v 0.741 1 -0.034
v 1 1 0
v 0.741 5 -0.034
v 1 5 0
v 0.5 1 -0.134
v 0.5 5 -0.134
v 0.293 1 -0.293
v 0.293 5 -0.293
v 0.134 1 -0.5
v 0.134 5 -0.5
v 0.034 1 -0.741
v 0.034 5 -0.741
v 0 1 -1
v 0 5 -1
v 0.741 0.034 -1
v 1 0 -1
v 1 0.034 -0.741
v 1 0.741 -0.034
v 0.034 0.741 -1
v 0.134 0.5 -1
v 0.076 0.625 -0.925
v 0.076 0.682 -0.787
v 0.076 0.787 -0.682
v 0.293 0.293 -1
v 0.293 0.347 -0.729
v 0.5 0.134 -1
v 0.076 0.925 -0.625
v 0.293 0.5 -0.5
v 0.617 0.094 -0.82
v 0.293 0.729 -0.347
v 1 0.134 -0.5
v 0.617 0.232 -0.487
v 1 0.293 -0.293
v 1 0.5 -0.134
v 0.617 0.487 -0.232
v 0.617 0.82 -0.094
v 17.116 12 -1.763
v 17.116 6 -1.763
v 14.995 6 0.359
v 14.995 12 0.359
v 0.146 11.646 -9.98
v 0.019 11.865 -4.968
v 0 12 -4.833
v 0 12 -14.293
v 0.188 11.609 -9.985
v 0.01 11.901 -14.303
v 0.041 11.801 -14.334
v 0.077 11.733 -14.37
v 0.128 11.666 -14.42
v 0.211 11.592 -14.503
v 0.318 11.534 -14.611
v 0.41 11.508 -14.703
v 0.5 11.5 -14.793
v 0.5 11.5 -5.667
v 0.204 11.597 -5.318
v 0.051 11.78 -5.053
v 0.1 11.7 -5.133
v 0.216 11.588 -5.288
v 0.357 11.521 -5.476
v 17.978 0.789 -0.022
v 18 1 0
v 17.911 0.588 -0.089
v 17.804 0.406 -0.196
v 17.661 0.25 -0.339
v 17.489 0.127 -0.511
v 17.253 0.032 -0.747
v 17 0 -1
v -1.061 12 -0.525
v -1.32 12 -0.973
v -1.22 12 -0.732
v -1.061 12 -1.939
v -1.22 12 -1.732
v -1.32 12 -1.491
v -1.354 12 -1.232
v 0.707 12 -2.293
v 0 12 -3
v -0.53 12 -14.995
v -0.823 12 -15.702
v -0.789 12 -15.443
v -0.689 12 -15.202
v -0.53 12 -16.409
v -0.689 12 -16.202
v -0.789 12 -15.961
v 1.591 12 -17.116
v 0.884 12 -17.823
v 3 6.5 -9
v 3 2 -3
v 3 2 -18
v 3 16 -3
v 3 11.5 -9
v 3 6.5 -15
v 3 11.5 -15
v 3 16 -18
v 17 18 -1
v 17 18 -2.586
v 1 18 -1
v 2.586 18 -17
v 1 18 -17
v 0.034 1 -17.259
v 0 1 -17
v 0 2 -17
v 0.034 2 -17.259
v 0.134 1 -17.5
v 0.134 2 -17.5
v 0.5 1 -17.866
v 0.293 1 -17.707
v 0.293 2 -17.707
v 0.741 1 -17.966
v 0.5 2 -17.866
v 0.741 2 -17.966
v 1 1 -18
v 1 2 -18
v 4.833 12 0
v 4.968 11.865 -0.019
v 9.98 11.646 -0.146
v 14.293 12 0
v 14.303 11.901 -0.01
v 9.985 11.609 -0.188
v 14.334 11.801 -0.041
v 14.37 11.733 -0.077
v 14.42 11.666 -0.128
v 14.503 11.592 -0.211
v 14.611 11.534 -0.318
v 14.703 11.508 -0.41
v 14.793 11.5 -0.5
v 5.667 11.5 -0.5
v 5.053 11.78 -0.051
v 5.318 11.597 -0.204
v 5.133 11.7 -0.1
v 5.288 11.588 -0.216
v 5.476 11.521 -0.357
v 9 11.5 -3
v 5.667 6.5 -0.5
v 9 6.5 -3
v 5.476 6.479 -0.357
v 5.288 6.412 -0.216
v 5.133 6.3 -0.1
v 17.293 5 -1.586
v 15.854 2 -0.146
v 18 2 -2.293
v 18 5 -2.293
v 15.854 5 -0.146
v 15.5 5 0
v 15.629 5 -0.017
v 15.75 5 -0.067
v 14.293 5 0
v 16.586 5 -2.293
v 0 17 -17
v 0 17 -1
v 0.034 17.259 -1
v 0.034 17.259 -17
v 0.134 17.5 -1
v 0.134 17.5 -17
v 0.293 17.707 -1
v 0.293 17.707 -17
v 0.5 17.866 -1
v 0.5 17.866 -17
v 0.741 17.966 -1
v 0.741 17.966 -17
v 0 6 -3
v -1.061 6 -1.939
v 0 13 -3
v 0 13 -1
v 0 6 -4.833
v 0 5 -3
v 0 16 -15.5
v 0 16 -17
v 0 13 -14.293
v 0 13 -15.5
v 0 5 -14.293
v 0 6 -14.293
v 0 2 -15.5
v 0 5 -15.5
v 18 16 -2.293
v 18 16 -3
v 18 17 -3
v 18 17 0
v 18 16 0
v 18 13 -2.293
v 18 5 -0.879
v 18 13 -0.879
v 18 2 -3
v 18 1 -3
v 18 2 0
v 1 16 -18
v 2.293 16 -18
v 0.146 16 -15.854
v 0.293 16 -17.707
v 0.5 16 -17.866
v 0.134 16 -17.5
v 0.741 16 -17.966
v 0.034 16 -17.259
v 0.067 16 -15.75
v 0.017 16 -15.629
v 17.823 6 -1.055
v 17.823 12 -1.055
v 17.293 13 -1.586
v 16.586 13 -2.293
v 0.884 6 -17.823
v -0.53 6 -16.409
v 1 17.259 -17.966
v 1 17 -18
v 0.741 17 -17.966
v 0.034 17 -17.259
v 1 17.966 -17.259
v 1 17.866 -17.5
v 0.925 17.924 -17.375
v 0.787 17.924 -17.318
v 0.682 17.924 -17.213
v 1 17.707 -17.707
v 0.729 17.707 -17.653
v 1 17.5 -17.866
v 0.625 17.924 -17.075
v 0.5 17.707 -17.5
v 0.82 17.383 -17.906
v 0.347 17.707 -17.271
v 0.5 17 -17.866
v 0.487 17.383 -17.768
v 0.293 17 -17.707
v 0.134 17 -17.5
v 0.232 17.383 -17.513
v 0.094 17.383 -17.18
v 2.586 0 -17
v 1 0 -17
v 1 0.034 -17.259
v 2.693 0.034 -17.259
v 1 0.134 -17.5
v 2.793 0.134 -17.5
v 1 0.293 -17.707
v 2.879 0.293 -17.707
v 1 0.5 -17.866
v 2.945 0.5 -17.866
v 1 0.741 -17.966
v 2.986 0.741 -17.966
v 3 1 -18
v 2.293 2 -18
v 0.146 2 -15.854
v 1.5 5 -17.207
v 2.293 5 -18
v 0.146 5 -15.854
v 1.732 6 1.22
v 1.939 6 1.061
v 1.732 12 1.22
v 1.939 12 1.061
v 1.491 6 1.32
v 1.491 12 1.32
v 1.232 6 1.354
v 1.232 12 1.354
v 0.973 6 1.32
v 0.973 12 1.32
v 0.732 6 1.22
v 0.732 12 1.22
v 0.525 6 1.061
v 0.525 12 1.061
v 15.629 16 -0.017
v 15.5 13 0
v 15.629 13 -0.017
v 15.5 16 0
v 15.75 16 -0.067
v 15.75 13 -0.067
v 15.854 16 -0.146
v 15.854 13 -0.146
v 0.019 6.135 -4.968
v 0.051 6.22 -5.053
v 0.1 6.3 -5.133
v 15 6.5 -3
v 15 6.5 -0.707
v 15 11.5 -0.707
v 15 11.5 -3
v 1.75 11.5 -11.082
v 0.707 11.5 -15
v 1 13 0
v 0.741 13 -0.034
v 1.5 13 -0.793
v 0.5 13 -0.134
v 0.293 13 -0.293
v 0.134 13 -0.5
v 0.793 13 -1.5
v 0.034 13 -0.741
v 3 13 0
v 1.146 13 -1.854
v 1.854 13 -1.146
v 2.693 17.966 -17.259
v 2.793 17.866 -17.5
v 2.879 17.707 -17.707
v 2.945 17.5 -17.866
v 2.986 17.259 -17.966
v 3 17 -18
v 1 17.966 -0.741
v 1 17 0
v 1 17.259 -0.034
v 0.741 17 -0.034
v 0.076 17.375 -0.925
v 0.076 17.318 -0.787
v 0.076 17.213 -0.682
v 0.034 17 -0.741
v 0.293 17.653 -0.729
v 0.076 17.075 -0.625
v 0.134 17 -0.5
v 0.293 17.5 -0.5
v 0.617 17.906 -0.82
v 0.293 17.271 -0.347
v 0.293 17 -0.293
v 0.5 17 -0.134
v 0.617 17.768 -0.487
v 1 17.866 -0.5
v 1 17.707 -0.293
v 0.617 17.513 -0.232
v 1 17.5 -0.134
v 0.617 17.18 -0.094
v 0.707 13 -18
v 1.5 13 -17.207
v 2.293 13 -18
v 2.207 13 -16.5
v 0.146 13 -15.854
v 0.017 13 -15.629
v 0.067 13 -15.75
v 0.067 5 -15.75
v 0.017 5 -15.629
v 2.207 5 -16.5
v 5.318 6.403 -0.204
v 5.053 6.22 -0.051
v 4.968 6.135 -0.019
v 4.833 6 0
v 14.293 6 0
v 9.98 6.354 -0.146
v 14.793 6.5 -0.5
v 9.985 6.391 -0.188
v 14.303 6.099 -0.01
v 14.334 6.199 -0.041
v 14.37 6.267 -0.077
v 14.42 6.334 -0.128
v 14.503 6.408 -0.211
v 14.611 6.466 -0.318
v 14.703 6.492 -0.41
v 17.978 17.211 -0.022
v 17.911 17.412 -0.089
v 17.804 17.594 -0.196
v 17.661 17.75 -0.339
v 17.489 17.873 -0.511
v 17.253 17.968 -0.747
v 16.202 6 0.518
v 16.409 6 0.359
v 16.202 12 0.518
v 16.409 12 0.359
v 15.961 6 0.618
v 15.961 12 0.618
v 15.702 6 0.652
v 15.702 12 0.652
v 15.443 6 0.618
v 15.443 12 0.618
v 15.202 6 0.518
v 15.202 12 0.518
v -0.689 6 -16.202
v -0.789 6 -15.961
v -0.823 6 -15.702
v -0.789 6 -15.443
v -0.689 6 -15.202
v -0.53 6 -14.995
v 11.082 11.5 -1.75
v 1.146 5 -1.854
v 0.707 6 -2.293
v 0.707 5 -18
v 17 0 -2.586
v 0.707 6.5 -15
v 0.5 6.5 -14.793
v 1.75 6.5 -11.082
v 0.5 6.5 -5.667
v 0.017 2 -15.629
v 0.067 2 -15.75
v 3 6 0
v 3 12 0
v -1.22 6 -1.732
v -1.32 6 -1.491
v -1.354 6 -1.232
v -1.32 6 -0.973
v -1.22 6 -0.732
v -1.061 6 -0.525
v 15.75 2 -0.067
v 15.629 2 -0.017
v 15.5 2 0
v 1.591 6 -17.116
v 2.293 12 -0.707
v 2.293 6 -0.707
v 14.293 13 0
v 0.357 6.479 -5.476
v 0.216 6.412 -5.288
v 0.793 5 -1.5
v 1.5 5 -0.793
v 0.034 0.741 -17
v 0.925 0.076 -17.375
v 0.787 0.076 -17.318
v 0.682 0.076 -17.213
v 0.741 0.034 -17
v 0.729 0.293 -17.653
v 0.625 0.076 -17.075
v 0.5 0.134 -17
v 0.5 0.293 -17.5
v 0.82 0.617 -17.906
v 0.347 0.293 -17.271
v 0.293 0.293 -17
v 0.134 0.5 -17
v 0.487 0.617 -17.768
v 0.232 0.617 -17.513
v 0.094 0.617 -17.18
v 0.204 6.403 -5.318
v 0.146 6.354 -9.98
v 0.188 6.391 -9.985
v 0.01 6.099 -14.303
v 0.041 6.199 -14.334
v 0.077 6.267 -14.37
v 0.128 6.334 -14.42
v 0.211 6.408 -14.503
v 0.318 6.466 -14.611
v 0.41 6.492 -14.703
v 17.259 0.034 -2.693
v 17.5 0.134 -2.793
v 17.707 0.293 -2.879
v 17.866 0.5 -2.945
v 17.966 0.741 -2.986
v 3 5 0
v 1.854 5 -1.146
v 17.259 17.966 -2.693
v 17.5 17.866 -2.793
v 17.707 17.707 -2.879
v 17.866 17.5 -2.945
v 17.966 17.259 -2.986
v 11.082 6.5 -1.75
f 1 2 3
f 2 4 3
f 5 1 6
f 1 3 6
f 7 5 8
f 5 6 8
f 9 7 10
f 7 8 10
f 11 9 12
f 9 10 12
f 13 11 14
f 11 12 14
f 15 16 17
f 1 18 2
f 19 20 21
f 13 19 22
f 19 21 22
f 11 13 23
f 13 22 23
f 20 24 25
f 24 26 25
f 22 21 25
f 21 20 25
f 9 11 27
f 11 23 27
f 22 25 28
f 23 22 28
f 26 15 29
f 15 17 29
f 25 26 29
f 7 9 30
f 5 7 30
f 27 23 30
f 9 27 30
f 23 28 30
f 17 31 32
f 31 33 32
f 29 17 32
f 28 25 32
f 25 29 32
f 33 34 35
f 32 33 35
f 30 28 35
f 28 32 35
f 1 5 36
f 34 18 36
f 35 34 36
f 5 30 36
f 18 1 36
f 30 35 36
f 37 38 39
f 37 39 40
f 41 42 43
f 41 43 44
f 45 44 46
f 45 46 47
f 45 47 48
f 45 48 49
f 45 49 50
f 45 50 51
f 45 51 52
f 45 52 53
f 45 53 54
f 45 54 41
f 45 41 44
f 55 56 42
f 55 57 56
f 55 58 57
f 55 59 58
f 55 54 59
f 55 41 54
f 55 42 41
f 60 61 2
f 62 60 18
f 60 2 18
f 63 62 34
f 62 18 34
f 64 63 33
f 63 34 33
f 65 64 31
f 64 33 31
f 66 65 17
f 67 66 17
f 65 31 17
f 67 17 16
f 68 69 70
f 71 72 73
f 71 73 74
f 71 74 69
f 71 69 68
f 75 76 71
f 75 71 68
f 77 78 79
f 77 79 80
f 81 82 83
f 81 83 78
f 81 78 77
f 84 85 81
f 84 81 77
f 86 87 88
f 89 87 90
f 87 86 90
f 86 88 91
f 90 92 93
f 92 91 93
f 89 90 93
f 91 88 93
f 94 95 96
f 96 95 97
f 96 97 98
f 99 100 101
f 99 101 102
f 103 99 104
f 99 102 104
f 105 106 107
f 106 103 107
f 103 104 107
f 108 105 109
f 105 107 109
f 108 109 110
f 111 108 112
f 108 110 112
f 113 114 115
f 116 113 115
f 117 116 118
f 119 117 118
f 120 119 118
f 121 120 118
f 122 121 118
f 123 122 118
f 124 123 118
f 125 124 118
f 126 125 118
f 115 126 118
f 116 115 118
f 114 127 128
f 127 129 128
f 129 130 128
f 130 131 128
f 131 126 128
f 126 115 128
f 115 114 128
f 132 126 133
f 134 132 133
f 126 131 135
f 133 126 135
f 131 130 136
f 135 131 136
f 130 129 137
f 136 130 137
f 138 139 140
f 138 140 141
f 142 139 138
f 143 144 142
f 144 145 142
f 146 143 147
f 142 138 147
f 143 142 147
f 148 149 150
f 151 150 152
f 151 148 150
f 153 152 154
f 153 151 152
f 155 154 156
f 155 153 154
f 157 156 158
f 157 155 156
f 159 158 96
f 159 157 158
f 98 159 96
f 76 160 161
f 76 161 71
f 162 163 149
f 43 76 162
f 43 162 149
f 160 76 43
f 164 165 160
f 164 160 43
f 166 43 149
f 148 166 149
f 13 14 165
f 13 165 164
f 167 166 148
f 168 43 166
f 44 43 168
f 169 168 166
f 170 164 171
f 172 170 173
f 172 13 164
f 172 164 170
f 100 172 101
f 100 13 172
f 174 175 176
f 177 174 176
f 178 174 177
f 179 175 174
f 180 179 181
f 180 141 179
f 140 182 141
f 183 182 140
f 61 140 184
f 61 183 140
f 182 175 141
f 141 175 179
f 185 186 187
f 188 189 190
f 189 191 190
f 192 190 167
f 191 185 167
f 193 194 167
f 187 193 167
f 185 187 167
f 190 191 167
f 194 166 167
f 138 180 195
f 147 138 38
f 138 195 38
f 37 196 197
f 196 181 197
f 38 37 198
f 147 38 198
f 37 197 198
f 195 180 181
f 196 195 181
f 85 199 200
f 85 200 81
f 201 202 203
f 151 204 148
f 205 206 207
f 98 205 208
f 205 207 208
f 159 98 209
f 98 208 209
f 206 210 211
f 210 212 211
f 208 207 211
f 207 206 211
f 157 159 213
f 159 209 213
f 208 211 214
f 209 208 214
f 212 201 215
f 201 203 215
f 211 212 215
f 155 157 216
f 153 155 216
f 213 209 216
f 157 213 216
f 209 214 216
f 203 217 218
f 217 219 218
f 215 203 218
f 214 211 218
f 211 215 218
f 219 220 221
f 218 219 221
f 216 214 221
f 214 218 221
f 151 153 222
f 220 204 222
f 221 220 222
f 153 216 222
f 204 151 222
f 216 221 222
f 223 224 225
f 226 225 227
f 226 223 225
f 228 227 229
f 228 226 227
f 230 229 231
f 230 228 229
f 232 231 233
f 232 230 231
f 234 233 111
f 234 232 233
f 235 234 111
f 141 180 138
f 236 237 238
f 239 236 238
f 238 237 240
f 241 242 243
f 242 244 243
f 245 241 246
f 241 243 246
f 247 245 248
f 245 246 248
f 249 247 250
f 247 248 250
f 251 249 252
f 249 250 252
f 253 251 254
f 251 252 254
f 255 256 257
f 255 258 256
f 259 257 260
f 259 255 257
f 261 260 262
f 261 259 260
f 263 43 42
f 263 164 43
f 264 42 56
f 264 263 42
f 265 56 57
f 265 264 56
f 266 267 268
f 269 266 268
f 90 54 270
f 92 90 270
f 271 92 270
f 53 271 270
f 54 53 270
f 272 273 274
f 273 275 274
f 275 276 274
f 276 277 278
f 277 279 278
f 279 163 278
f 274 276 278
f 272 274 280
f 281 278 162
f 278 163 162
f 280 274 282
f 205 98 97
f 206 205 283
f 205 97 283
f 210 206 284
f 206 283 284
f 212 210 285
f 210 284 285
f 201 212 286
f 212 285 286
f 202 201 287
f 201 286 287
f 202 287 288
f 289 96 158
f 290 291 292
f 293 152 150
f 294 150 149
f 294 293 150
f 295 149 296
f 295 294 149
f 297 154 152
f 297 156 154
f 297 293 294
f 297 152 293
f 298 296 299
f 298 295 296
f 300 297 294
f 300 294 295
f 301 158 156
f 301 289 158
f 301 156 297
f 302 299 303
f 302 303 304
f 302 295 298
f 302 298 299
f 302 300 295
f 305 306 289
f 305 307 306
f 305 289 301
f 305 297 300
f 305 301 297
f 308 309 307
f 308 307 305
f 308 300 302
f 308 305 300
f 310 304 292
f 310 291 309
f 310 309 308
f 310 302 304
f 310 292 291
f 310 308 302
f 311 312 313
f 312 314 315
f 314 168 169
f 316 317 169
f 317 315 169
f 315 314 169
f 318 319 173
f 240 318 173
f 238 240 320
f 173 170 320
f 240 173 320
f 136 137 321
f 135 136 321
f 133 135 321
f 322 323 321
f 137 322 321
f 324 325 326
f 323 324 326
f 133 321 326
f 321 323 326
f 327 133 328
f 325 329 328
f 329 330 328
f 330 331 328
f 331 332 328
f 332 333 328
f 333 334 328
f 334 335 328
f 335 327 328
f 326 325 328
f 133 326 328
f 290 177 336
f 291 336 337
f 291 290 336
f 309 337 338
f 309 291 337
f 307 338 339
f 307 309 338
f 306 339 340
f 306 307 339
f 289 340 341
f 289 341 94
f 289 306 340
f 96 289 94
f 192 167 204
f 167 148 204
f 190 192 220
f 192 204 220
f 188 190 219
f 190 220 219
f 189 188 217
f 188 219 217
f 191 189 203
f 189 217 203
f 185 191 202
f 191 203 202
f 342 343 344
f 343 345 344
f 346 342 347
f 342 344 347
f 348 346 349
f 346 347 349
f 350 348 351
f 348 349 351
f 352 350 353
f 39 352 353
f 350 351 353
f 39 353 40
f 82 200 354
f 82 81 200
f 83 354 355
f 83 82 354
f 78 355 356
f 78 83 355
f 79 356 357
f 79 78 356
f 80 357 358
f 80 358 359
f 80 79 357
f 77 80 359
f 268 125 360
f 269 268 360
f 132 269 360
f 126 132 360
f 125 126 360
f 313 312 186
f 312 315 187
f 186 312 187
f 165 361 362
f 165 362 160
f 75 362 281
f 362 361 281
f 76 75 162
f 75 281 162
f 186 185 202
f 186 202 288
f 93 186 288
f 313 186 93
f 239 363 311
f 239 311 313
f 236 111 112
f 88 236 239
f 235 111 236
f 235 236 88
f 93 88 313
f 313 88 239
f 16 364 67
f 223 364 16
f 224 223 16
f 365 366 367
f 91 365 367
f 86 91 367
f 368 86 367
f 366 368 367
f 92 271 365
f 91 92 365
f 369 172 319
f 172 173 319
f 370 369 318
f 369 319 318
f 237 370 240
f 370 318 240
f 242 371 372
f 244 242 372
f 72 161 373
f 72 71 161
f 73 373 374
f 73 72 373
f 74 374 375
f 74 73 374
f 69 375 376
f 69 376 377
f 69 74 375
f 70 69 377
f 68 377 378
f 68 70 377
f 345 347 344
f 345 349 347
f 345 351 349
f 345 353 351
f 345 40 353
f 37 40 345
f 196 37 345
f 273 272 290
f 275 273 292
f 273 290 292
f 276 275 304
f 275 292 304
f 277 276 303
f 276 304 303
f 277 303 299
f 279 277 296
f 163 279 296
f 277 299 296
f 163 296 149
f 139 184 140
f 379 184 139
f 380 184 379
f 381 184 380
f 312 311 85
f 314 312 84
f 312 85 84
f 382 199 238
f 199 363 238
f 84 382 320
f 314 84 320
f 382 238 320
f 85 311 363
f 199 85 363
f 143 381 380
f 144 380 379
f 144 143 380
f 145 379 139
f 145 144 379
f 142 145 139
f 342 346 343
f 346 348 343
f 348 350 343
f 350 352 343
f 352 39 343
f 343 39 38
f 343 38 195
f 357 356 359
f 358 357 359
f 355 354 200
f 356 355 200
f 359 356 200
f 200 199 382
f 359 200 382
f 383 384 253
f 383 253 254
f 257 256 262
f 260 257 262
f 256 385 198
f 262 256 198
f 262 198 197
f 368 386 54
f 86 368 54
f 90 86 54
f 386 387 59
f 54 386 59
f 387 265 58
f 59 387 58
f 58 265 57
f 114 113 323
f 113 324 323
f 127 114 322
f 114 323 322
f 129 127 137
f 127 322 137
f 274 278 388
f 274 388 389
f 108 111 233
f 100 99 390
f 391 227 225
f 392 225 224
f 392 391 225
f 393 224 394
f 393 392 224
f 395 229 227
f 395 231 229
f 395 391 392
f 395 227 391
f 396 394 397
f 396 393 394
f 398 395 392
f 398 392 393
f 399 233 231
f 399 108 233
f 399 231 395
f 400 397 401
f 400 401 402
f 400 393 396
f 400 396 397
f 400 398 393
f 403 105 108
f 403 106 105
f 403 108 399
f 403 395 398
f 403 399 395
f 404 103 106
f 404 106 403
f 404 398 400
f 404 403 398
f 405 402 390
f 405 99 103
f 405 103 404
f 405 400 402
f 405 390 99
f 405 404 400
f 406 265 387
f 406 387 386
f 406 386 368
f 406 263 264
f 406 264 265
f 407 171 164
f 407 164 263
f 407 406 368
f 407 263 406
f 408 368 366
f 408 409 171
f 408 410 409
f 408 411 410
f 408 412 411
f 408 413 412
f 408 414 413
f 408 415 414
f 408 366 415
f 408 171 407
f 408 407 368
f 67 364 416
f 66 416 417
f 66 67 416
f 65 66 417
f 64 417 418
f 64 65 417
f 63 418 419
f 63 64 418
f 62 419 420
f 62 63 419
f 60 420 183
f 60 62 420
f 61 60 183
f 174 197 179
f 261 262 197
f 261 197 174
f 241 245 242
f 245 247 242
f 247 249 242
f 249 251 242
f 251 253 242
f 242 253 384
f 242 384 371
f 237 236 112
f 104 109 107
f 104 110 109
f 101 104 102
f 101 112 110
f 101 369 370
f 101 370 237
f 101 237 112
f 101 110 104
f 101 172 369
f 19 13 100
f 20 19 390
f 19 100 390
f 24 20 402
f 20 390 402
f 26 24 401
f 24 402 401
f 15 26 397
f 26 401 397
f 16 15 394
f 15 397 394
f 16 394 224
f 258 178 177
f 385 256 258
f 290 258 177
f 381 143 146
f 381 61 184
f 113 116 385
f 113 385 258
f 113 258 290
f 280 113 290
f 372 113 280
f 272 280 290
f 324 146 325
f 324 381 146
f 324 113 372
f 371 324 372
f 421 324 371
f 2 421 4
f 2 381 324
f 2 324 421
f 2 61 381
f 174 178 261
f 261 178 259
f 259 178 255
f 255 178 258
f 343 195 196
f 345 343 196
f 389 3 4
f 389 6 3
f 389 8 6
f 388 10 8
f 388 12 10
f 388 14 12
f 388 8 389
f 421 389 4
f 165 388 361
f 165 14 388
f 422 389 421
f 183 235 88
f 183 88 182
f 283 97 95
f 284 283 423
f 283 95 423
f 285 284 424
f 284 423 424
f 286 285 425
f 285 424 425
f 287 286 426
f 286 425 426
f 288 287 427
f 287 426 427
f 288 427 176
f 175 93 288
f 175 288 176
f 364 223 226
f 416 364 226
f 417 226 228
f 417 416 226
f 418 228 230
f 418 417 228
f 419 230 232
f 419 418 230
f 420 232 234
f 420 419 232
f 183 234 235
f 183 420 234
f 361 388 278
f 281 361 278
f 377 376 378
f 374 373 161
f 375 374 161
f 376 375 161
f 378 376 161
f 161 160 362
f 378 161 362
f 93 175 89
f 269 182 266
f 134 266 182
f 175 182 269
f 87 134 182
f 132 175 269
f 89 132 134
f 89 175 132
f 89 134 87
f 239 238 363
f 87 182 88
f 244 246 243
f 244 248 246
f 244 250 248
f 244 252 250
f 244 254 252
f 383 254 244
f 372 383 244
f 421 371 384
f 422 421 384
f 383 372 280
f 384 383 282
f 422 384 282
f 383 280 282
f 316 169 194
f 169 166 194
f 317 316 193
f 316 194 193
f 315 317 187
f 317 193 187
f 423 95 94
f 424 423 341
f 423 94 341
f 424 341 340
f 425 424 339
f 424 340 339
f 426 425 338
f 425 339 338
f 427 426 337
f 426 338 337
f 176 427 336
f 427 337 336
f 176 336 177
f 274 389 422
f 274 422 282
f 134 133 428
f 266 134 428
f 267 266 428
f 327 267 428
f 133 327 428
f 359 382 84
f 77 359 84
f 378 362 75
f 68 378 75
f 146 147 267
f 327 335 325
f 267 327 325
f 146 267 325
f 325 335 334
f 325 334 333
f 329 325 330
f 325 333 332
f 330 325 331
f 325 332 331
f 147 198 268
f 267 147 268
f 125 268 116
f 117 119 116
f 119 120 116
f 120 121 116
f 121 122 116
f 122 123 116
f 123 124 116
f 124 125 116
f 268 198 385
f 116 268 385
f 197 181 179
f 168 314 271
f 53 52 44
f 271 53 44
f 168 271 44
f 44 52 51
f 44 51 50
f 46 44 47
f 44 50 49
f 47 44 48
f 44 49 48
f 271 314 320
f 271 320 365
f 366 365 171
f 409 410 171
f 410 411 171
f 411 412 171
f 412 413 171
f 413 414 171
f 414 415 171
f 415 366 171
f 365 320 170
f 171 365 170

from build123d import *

# Parameters (mm, degrees)
BOSS_EXTRUDE1_DEPTH = 18
SKETCH2_W           = 15
SKETCH2_H           = 14
CUT_EXTRUDE1_DEPTH  = 15
CUT_EXTRUDE2_START  = -3.742641
SKETCH7_W           = 2
SKETCH7_H           = 3
CUT_EXTRUDE2_DEPTH  = 3.242641
CUT_EXTRUDE4_REACH  = 30.583
SKETCH9_W           = 1
SKETCH9_H           = 6
BOSS_EXTRUDE2_DEPTH = 3
CUT_EXTRUDE5_REACH  = 30.583
SKETCH11_W          = 1
SKETCH11_H          = 6
BOSS_EXTRUDE3_DEPTH = 3
CUT_EXTRUDE6_DEPTH  = 4
SKETCH13_W          = 1
SKETCH13_H          = 6
BOSS_EXTRUDE4_DEPTH = 2.5
SKETCH14_W          = 1
SKETCH14_H          = 8
BOSS_EXTRUDE5_DEPTH = 0.5
FILLET3_R           = 1
FILLET4_R           = 0.5


with BuildPart() as part:
    # Sketch1 → Boss-Extrude1 (new body)
    with BuildSketch(Plane(origin=(0, 0, 0), x_dir=(1, 0, 0), z_dir=(0, 1, 0))):
        Polygon((0, 0), (0, 18), (3, 18), (18, 3), (18, 0), align=None)
    extrude(amount=BOSS_EXTRUDE1_DEPTH)

    # Sketch2 → Cut-Extrude1 (cut)
    with BuildSketch(Plane(origin=(0, 0, -18), x_dir=(-1, 0, 0), z_dir=(0, 0, -1))):
        with Locations((-10.5, 9)):
            Rectangle(SKETCH2_W, SKETCH2_H)
    extrude(amount=-CUT_EXTRUDE1_DEPTH, mode=Mode.SUBTRACT)

    # Sketch3 → Cut-Loft1 section 0
    with BuildSketch(Plane(origin=(0, 0, -3), x_dir=(-1, 0, 0), z_dir=(0, 0, -1))):
        with BuildLine():
            Line((-15, 11.5), (-9, 11.5))
            Line((-9, 11.5), (-9, 6.5))
            Line((-9, 6.5), (-15, 6.5))
            Line((-15, 6.5), (-15, 11.5))
        make_face()
    # Sketch6 → Cut-Loft1 section 1
    with BuildSketch(Plane.XY):
        with BuildLine():
            Line((15, 11.5), (5, 11.5))
            Line((5, 11.5), (5, 6.5))
            Line((5, 6.5), (15, 6.5))
            Line((15, 6.5), (15, 11.5))
        make_face()
    loft(mode=Mode.SUBTRACT)

    # Sketch4 → Cut-Loft2 section 0
    with BuildSketch(Plane(origin=(3, 0, 0), x_dir=(0, 0, -1), z_dir=(1, 0, 0))):
        with BuildLine():
            Line((9, 11.5), (15, 11.5))
            Line((15, 11.5), (15, 6.5))
            Line((15, 6.5), (9, 6.5))
            Line((9, 6.5), (9, 11.5))
        make_face()
    # Sketch5 → Cut-Loft2 section 1
    with BuildSketch(Plane.ZY):
        with BuildLine():
            Line((-15, 11.5), (-5, 11.5))
            Line((-5, 11.5), (-5, 6.5))
            Line((-5, 6.5), (-15, 6.5))
            Line((-15, 6.5), (-15, 11.5))
        make_face()
    loft(mode=Mode.SUBTRACT)

    # Sketch7 → Cut-Extrude2 (cut)
    with BuildSketch(Plane(origin=(10.5, 0, -10.5), x_dir=(-0.7071067811865475, 0, -0.7071067811865477), z_dir=(0.7071067811865477, 0, -0.7071067811865475)).offset(CUT_EXTRUDE2_START)):
        with Locations((12.106601718, 14.5)):
            Rectangle(SKETCH7_W, SKETCH7_H)
        with Locations((12.106601718, 3.5)):
            Rectangle(SKETCH7_W, SKETCH7_H)
        with Locations((-12.106601718, 14.5)):
            Rectangle(SKETCH7_W, SKETCH7_H)
        with Locations((-12.106601718, 3.5)):
            Rectangle(SKETCH7_W, SKETCH7_H)
    extrude(amount=CUT_EXTRUDE2_DEPTH, mode=Mode.SUBTRACT)

    # Cut-Extrude4: up to this face of the body (flat: up to its plane)
    cut_extrude4_end = Plane(part.part.faces().sort_by_distance((0.76429774, 13, -17.23570226))[0])
    # Sketch8 → Cut-Extrude4 (cut, up to the picked face)
    with BuildSketch(Plane.XZ.offset(-5), mode=Mode.PRIVATE) as cut_extrude4_sk1:
        Polygon((0.707163247, -18), (2.207135014, -16.500028233), (-0.113993924, -14.178899295), (-1.613965691, -15.678871062), align=None)
    cut_extrude4_tool1 = split(extrude(cut_extrude4_sk1.sketch, amount=-CUT_EXTRUDE4_REACH, mode=Mode.PRIVATE), bisect_by=cut_extrude4_end, keep=Keep.BOTH, mode=Mode.PRIVATE)
    add(cut_extrude4_tool1.solids().sort_by(Axis((0.296585, 5, -16.08945), (0, 1, 0)))[0], mode=Mode.SUBTRACT)


with BuildPart() as cut_extrude4_kept_piece:
    # of the separate pieces the step leaves, the one the design keeps (cut_extrude4_pieces_kept)
    add(part.part.solids().sort_by_distance((0, 0, 0))[0])

    # Sketch9 → Boss-Extrude2 (add)
    with BuildSketch(Plane(origin=(9.353581623, 0, -9.353581623), x_dir=(0.7071067811865475, 0, 0.7071067811865477), z_dir=(-0.7071067811865477, 0, 0.7071067811865475))):
        with Locations((-11.477882134, 9)):
            Rectangle(SKETCH9_W, SKETCH9_H)
    extrude(amount=BOSS_EXTRUDE2_DEPTH)

    # Cut-Extrude5: up to this face of the body (flat: up to its plane)
    cut_extrude5_end = Plane(cut_extrude4_kept_piece.part.faces().sort_by_distance((17.23570226, 5, -0.76429774))[0])
    # Sketch10 → Cut-Extrude5 (cut, up to the picked face)
    with BuildSketch(Plane(origin=(0, 13, 0), x_dir=(1, 0, 0), z_dir=(0, 1, 0)), mode=Mode.PRIVATE) as cut_extrude5_sk1:
        Polygon((18.647815387, 0.23086427), (16.585786438, 2.292893219), (13.714418547, -0.578474672), (15.776447496, -2.640503621), align=None)
    cut_extrude5_tool1 = split(extrude(cut_extrude5_sk1.sketch, amount=-CUT_EXTRUDE5_REACH, mode=Mode.PRIVATE), bisect_by=cut_extrude5_end, keep=Keep.BOTH, mode=Mode.PRIVATE)
    add(cut_extrude5_tool1.solids().sort_by(Axis((16.181117, 13, 0.173805), (0, -1, 0)))[0], mode=Mode.SUBTRACT)

    # Sketch11 → Boss-Extrude3 (add)
    with BuildSketch(Plane(origin=(9.439339828, 0, -9.439339828), x_dir=(0.7071067811865474, 0, 0.7071067811865478), z_dir=(-0.7071067811865478, 0, 0.7071067811865474))):
        with Locations((11.356601718, 9)):
            Rectangle(SKETCH11_W, SKETCH11_H)
    extrude(amount=BOSS_EXTRUDE3_DEPTH)

    # Sketch12 → Cut-Extrude6 (cut, symmetric)
    with BuildSketch(Plane(origin=(0, 9, 0), x_dir=(1, 0, 0), z_dir=(0, 1, 0))):
        Polygon((0, 3), (0, 0), (3, 0), align=None)
    extrude(amount=CUT_EXTRUDE6_DEPTH, both=True, mode=Mode.SUBTRACT)

    # Sketch13 → Boss-Extrude4 (add)
    with BuildSketch(Plane(origin=(1.5, 0, -1.5), x_dir=(0.7071067811865475, 0, 0.7071067811865477), z_dir=(-0.7071067811865477, 0, 0.7071067811865475))):
        with Locations((1.621320344, 9)):
            Rectangle(SKETCH13_W, SKETCH13_H)
        with Locations((-1.621320344, 9)):
            Rectangle(SKETCH13_W, SKETCH13_H)
    extrude(amount=BOSS_EXTRUDE4_DEPTH)

    # Sketch14 → Boss-Extrude5 (add, symmetric)
    with BuildSketch(Plane(origin=(1.5, 0, -1.5), x_dir=(0.7071067811865475, 0, 0.7071067811865477), z_dir=(-0.7071067811865477, 0, 0.7071067811865475))):
        with Locations((0, 9)):
            Rectangle(SKETCH14_W, SKETCH14_H)
    extrude(amount=BOSS_EXTRUDE5_DEPTH, both=True)

    # Fillet3
    fillet3_edges = [cut_extrude4_kept_piece.edges().sort_by_distance(p)[0] for p in [
        (-1.237380402, 9, -15.701902961),
        (-1.767766953, 9, -1.232233047),
        (1.232233047, 9, 1.767766953),
        (15.701902961, 9, 1.065863992),
        (0, 1, -18),
        (0, 17, -18),
        (1.5, 18, -18),
        (1.5, 0, -18),
        (9, 0, 0),
        (18, 0, -1.5),
        (10.5, 0, -10.5),
        (9, 18, 0),
        (18, 18, -1.5),
        (10.5, 18, -10.5),
        (0, 18, -9),
        (0, 0, -9),
        (0, 15.5, 0),
        (0, 2.5, 0),
    ]]
    fillet(fillet3_edges, radius=FILLET3_R - 0.0001)  # a hair under: the kernel refuses the full size

    # Fillet4
    fillet4_edges = [cut_extrude4_kept_piece.edges().sort_by_distance(p)[0] for p in [
        (15.70710656, 14.5, 2.21e-07),
        (15.70710656, 3.5, 2.21e-07),
        (5, 9, 0),
        (9.646446609, 6.5, 0),
        (0, 9, -5),
        (9.646446609, 11.5, 0),
        (0, 6.5, -9.646446609),
        (0, 11.5, -9.646446609),
        (-2.21e-07, 14.5, -15.70710656),
        (-2.21e-07, 3.5, -15.70710656),
    ]]
    fillet(fillet4_edges, radius=FILLET4_R)


solid = cut_extrude4_kept_piece.part
